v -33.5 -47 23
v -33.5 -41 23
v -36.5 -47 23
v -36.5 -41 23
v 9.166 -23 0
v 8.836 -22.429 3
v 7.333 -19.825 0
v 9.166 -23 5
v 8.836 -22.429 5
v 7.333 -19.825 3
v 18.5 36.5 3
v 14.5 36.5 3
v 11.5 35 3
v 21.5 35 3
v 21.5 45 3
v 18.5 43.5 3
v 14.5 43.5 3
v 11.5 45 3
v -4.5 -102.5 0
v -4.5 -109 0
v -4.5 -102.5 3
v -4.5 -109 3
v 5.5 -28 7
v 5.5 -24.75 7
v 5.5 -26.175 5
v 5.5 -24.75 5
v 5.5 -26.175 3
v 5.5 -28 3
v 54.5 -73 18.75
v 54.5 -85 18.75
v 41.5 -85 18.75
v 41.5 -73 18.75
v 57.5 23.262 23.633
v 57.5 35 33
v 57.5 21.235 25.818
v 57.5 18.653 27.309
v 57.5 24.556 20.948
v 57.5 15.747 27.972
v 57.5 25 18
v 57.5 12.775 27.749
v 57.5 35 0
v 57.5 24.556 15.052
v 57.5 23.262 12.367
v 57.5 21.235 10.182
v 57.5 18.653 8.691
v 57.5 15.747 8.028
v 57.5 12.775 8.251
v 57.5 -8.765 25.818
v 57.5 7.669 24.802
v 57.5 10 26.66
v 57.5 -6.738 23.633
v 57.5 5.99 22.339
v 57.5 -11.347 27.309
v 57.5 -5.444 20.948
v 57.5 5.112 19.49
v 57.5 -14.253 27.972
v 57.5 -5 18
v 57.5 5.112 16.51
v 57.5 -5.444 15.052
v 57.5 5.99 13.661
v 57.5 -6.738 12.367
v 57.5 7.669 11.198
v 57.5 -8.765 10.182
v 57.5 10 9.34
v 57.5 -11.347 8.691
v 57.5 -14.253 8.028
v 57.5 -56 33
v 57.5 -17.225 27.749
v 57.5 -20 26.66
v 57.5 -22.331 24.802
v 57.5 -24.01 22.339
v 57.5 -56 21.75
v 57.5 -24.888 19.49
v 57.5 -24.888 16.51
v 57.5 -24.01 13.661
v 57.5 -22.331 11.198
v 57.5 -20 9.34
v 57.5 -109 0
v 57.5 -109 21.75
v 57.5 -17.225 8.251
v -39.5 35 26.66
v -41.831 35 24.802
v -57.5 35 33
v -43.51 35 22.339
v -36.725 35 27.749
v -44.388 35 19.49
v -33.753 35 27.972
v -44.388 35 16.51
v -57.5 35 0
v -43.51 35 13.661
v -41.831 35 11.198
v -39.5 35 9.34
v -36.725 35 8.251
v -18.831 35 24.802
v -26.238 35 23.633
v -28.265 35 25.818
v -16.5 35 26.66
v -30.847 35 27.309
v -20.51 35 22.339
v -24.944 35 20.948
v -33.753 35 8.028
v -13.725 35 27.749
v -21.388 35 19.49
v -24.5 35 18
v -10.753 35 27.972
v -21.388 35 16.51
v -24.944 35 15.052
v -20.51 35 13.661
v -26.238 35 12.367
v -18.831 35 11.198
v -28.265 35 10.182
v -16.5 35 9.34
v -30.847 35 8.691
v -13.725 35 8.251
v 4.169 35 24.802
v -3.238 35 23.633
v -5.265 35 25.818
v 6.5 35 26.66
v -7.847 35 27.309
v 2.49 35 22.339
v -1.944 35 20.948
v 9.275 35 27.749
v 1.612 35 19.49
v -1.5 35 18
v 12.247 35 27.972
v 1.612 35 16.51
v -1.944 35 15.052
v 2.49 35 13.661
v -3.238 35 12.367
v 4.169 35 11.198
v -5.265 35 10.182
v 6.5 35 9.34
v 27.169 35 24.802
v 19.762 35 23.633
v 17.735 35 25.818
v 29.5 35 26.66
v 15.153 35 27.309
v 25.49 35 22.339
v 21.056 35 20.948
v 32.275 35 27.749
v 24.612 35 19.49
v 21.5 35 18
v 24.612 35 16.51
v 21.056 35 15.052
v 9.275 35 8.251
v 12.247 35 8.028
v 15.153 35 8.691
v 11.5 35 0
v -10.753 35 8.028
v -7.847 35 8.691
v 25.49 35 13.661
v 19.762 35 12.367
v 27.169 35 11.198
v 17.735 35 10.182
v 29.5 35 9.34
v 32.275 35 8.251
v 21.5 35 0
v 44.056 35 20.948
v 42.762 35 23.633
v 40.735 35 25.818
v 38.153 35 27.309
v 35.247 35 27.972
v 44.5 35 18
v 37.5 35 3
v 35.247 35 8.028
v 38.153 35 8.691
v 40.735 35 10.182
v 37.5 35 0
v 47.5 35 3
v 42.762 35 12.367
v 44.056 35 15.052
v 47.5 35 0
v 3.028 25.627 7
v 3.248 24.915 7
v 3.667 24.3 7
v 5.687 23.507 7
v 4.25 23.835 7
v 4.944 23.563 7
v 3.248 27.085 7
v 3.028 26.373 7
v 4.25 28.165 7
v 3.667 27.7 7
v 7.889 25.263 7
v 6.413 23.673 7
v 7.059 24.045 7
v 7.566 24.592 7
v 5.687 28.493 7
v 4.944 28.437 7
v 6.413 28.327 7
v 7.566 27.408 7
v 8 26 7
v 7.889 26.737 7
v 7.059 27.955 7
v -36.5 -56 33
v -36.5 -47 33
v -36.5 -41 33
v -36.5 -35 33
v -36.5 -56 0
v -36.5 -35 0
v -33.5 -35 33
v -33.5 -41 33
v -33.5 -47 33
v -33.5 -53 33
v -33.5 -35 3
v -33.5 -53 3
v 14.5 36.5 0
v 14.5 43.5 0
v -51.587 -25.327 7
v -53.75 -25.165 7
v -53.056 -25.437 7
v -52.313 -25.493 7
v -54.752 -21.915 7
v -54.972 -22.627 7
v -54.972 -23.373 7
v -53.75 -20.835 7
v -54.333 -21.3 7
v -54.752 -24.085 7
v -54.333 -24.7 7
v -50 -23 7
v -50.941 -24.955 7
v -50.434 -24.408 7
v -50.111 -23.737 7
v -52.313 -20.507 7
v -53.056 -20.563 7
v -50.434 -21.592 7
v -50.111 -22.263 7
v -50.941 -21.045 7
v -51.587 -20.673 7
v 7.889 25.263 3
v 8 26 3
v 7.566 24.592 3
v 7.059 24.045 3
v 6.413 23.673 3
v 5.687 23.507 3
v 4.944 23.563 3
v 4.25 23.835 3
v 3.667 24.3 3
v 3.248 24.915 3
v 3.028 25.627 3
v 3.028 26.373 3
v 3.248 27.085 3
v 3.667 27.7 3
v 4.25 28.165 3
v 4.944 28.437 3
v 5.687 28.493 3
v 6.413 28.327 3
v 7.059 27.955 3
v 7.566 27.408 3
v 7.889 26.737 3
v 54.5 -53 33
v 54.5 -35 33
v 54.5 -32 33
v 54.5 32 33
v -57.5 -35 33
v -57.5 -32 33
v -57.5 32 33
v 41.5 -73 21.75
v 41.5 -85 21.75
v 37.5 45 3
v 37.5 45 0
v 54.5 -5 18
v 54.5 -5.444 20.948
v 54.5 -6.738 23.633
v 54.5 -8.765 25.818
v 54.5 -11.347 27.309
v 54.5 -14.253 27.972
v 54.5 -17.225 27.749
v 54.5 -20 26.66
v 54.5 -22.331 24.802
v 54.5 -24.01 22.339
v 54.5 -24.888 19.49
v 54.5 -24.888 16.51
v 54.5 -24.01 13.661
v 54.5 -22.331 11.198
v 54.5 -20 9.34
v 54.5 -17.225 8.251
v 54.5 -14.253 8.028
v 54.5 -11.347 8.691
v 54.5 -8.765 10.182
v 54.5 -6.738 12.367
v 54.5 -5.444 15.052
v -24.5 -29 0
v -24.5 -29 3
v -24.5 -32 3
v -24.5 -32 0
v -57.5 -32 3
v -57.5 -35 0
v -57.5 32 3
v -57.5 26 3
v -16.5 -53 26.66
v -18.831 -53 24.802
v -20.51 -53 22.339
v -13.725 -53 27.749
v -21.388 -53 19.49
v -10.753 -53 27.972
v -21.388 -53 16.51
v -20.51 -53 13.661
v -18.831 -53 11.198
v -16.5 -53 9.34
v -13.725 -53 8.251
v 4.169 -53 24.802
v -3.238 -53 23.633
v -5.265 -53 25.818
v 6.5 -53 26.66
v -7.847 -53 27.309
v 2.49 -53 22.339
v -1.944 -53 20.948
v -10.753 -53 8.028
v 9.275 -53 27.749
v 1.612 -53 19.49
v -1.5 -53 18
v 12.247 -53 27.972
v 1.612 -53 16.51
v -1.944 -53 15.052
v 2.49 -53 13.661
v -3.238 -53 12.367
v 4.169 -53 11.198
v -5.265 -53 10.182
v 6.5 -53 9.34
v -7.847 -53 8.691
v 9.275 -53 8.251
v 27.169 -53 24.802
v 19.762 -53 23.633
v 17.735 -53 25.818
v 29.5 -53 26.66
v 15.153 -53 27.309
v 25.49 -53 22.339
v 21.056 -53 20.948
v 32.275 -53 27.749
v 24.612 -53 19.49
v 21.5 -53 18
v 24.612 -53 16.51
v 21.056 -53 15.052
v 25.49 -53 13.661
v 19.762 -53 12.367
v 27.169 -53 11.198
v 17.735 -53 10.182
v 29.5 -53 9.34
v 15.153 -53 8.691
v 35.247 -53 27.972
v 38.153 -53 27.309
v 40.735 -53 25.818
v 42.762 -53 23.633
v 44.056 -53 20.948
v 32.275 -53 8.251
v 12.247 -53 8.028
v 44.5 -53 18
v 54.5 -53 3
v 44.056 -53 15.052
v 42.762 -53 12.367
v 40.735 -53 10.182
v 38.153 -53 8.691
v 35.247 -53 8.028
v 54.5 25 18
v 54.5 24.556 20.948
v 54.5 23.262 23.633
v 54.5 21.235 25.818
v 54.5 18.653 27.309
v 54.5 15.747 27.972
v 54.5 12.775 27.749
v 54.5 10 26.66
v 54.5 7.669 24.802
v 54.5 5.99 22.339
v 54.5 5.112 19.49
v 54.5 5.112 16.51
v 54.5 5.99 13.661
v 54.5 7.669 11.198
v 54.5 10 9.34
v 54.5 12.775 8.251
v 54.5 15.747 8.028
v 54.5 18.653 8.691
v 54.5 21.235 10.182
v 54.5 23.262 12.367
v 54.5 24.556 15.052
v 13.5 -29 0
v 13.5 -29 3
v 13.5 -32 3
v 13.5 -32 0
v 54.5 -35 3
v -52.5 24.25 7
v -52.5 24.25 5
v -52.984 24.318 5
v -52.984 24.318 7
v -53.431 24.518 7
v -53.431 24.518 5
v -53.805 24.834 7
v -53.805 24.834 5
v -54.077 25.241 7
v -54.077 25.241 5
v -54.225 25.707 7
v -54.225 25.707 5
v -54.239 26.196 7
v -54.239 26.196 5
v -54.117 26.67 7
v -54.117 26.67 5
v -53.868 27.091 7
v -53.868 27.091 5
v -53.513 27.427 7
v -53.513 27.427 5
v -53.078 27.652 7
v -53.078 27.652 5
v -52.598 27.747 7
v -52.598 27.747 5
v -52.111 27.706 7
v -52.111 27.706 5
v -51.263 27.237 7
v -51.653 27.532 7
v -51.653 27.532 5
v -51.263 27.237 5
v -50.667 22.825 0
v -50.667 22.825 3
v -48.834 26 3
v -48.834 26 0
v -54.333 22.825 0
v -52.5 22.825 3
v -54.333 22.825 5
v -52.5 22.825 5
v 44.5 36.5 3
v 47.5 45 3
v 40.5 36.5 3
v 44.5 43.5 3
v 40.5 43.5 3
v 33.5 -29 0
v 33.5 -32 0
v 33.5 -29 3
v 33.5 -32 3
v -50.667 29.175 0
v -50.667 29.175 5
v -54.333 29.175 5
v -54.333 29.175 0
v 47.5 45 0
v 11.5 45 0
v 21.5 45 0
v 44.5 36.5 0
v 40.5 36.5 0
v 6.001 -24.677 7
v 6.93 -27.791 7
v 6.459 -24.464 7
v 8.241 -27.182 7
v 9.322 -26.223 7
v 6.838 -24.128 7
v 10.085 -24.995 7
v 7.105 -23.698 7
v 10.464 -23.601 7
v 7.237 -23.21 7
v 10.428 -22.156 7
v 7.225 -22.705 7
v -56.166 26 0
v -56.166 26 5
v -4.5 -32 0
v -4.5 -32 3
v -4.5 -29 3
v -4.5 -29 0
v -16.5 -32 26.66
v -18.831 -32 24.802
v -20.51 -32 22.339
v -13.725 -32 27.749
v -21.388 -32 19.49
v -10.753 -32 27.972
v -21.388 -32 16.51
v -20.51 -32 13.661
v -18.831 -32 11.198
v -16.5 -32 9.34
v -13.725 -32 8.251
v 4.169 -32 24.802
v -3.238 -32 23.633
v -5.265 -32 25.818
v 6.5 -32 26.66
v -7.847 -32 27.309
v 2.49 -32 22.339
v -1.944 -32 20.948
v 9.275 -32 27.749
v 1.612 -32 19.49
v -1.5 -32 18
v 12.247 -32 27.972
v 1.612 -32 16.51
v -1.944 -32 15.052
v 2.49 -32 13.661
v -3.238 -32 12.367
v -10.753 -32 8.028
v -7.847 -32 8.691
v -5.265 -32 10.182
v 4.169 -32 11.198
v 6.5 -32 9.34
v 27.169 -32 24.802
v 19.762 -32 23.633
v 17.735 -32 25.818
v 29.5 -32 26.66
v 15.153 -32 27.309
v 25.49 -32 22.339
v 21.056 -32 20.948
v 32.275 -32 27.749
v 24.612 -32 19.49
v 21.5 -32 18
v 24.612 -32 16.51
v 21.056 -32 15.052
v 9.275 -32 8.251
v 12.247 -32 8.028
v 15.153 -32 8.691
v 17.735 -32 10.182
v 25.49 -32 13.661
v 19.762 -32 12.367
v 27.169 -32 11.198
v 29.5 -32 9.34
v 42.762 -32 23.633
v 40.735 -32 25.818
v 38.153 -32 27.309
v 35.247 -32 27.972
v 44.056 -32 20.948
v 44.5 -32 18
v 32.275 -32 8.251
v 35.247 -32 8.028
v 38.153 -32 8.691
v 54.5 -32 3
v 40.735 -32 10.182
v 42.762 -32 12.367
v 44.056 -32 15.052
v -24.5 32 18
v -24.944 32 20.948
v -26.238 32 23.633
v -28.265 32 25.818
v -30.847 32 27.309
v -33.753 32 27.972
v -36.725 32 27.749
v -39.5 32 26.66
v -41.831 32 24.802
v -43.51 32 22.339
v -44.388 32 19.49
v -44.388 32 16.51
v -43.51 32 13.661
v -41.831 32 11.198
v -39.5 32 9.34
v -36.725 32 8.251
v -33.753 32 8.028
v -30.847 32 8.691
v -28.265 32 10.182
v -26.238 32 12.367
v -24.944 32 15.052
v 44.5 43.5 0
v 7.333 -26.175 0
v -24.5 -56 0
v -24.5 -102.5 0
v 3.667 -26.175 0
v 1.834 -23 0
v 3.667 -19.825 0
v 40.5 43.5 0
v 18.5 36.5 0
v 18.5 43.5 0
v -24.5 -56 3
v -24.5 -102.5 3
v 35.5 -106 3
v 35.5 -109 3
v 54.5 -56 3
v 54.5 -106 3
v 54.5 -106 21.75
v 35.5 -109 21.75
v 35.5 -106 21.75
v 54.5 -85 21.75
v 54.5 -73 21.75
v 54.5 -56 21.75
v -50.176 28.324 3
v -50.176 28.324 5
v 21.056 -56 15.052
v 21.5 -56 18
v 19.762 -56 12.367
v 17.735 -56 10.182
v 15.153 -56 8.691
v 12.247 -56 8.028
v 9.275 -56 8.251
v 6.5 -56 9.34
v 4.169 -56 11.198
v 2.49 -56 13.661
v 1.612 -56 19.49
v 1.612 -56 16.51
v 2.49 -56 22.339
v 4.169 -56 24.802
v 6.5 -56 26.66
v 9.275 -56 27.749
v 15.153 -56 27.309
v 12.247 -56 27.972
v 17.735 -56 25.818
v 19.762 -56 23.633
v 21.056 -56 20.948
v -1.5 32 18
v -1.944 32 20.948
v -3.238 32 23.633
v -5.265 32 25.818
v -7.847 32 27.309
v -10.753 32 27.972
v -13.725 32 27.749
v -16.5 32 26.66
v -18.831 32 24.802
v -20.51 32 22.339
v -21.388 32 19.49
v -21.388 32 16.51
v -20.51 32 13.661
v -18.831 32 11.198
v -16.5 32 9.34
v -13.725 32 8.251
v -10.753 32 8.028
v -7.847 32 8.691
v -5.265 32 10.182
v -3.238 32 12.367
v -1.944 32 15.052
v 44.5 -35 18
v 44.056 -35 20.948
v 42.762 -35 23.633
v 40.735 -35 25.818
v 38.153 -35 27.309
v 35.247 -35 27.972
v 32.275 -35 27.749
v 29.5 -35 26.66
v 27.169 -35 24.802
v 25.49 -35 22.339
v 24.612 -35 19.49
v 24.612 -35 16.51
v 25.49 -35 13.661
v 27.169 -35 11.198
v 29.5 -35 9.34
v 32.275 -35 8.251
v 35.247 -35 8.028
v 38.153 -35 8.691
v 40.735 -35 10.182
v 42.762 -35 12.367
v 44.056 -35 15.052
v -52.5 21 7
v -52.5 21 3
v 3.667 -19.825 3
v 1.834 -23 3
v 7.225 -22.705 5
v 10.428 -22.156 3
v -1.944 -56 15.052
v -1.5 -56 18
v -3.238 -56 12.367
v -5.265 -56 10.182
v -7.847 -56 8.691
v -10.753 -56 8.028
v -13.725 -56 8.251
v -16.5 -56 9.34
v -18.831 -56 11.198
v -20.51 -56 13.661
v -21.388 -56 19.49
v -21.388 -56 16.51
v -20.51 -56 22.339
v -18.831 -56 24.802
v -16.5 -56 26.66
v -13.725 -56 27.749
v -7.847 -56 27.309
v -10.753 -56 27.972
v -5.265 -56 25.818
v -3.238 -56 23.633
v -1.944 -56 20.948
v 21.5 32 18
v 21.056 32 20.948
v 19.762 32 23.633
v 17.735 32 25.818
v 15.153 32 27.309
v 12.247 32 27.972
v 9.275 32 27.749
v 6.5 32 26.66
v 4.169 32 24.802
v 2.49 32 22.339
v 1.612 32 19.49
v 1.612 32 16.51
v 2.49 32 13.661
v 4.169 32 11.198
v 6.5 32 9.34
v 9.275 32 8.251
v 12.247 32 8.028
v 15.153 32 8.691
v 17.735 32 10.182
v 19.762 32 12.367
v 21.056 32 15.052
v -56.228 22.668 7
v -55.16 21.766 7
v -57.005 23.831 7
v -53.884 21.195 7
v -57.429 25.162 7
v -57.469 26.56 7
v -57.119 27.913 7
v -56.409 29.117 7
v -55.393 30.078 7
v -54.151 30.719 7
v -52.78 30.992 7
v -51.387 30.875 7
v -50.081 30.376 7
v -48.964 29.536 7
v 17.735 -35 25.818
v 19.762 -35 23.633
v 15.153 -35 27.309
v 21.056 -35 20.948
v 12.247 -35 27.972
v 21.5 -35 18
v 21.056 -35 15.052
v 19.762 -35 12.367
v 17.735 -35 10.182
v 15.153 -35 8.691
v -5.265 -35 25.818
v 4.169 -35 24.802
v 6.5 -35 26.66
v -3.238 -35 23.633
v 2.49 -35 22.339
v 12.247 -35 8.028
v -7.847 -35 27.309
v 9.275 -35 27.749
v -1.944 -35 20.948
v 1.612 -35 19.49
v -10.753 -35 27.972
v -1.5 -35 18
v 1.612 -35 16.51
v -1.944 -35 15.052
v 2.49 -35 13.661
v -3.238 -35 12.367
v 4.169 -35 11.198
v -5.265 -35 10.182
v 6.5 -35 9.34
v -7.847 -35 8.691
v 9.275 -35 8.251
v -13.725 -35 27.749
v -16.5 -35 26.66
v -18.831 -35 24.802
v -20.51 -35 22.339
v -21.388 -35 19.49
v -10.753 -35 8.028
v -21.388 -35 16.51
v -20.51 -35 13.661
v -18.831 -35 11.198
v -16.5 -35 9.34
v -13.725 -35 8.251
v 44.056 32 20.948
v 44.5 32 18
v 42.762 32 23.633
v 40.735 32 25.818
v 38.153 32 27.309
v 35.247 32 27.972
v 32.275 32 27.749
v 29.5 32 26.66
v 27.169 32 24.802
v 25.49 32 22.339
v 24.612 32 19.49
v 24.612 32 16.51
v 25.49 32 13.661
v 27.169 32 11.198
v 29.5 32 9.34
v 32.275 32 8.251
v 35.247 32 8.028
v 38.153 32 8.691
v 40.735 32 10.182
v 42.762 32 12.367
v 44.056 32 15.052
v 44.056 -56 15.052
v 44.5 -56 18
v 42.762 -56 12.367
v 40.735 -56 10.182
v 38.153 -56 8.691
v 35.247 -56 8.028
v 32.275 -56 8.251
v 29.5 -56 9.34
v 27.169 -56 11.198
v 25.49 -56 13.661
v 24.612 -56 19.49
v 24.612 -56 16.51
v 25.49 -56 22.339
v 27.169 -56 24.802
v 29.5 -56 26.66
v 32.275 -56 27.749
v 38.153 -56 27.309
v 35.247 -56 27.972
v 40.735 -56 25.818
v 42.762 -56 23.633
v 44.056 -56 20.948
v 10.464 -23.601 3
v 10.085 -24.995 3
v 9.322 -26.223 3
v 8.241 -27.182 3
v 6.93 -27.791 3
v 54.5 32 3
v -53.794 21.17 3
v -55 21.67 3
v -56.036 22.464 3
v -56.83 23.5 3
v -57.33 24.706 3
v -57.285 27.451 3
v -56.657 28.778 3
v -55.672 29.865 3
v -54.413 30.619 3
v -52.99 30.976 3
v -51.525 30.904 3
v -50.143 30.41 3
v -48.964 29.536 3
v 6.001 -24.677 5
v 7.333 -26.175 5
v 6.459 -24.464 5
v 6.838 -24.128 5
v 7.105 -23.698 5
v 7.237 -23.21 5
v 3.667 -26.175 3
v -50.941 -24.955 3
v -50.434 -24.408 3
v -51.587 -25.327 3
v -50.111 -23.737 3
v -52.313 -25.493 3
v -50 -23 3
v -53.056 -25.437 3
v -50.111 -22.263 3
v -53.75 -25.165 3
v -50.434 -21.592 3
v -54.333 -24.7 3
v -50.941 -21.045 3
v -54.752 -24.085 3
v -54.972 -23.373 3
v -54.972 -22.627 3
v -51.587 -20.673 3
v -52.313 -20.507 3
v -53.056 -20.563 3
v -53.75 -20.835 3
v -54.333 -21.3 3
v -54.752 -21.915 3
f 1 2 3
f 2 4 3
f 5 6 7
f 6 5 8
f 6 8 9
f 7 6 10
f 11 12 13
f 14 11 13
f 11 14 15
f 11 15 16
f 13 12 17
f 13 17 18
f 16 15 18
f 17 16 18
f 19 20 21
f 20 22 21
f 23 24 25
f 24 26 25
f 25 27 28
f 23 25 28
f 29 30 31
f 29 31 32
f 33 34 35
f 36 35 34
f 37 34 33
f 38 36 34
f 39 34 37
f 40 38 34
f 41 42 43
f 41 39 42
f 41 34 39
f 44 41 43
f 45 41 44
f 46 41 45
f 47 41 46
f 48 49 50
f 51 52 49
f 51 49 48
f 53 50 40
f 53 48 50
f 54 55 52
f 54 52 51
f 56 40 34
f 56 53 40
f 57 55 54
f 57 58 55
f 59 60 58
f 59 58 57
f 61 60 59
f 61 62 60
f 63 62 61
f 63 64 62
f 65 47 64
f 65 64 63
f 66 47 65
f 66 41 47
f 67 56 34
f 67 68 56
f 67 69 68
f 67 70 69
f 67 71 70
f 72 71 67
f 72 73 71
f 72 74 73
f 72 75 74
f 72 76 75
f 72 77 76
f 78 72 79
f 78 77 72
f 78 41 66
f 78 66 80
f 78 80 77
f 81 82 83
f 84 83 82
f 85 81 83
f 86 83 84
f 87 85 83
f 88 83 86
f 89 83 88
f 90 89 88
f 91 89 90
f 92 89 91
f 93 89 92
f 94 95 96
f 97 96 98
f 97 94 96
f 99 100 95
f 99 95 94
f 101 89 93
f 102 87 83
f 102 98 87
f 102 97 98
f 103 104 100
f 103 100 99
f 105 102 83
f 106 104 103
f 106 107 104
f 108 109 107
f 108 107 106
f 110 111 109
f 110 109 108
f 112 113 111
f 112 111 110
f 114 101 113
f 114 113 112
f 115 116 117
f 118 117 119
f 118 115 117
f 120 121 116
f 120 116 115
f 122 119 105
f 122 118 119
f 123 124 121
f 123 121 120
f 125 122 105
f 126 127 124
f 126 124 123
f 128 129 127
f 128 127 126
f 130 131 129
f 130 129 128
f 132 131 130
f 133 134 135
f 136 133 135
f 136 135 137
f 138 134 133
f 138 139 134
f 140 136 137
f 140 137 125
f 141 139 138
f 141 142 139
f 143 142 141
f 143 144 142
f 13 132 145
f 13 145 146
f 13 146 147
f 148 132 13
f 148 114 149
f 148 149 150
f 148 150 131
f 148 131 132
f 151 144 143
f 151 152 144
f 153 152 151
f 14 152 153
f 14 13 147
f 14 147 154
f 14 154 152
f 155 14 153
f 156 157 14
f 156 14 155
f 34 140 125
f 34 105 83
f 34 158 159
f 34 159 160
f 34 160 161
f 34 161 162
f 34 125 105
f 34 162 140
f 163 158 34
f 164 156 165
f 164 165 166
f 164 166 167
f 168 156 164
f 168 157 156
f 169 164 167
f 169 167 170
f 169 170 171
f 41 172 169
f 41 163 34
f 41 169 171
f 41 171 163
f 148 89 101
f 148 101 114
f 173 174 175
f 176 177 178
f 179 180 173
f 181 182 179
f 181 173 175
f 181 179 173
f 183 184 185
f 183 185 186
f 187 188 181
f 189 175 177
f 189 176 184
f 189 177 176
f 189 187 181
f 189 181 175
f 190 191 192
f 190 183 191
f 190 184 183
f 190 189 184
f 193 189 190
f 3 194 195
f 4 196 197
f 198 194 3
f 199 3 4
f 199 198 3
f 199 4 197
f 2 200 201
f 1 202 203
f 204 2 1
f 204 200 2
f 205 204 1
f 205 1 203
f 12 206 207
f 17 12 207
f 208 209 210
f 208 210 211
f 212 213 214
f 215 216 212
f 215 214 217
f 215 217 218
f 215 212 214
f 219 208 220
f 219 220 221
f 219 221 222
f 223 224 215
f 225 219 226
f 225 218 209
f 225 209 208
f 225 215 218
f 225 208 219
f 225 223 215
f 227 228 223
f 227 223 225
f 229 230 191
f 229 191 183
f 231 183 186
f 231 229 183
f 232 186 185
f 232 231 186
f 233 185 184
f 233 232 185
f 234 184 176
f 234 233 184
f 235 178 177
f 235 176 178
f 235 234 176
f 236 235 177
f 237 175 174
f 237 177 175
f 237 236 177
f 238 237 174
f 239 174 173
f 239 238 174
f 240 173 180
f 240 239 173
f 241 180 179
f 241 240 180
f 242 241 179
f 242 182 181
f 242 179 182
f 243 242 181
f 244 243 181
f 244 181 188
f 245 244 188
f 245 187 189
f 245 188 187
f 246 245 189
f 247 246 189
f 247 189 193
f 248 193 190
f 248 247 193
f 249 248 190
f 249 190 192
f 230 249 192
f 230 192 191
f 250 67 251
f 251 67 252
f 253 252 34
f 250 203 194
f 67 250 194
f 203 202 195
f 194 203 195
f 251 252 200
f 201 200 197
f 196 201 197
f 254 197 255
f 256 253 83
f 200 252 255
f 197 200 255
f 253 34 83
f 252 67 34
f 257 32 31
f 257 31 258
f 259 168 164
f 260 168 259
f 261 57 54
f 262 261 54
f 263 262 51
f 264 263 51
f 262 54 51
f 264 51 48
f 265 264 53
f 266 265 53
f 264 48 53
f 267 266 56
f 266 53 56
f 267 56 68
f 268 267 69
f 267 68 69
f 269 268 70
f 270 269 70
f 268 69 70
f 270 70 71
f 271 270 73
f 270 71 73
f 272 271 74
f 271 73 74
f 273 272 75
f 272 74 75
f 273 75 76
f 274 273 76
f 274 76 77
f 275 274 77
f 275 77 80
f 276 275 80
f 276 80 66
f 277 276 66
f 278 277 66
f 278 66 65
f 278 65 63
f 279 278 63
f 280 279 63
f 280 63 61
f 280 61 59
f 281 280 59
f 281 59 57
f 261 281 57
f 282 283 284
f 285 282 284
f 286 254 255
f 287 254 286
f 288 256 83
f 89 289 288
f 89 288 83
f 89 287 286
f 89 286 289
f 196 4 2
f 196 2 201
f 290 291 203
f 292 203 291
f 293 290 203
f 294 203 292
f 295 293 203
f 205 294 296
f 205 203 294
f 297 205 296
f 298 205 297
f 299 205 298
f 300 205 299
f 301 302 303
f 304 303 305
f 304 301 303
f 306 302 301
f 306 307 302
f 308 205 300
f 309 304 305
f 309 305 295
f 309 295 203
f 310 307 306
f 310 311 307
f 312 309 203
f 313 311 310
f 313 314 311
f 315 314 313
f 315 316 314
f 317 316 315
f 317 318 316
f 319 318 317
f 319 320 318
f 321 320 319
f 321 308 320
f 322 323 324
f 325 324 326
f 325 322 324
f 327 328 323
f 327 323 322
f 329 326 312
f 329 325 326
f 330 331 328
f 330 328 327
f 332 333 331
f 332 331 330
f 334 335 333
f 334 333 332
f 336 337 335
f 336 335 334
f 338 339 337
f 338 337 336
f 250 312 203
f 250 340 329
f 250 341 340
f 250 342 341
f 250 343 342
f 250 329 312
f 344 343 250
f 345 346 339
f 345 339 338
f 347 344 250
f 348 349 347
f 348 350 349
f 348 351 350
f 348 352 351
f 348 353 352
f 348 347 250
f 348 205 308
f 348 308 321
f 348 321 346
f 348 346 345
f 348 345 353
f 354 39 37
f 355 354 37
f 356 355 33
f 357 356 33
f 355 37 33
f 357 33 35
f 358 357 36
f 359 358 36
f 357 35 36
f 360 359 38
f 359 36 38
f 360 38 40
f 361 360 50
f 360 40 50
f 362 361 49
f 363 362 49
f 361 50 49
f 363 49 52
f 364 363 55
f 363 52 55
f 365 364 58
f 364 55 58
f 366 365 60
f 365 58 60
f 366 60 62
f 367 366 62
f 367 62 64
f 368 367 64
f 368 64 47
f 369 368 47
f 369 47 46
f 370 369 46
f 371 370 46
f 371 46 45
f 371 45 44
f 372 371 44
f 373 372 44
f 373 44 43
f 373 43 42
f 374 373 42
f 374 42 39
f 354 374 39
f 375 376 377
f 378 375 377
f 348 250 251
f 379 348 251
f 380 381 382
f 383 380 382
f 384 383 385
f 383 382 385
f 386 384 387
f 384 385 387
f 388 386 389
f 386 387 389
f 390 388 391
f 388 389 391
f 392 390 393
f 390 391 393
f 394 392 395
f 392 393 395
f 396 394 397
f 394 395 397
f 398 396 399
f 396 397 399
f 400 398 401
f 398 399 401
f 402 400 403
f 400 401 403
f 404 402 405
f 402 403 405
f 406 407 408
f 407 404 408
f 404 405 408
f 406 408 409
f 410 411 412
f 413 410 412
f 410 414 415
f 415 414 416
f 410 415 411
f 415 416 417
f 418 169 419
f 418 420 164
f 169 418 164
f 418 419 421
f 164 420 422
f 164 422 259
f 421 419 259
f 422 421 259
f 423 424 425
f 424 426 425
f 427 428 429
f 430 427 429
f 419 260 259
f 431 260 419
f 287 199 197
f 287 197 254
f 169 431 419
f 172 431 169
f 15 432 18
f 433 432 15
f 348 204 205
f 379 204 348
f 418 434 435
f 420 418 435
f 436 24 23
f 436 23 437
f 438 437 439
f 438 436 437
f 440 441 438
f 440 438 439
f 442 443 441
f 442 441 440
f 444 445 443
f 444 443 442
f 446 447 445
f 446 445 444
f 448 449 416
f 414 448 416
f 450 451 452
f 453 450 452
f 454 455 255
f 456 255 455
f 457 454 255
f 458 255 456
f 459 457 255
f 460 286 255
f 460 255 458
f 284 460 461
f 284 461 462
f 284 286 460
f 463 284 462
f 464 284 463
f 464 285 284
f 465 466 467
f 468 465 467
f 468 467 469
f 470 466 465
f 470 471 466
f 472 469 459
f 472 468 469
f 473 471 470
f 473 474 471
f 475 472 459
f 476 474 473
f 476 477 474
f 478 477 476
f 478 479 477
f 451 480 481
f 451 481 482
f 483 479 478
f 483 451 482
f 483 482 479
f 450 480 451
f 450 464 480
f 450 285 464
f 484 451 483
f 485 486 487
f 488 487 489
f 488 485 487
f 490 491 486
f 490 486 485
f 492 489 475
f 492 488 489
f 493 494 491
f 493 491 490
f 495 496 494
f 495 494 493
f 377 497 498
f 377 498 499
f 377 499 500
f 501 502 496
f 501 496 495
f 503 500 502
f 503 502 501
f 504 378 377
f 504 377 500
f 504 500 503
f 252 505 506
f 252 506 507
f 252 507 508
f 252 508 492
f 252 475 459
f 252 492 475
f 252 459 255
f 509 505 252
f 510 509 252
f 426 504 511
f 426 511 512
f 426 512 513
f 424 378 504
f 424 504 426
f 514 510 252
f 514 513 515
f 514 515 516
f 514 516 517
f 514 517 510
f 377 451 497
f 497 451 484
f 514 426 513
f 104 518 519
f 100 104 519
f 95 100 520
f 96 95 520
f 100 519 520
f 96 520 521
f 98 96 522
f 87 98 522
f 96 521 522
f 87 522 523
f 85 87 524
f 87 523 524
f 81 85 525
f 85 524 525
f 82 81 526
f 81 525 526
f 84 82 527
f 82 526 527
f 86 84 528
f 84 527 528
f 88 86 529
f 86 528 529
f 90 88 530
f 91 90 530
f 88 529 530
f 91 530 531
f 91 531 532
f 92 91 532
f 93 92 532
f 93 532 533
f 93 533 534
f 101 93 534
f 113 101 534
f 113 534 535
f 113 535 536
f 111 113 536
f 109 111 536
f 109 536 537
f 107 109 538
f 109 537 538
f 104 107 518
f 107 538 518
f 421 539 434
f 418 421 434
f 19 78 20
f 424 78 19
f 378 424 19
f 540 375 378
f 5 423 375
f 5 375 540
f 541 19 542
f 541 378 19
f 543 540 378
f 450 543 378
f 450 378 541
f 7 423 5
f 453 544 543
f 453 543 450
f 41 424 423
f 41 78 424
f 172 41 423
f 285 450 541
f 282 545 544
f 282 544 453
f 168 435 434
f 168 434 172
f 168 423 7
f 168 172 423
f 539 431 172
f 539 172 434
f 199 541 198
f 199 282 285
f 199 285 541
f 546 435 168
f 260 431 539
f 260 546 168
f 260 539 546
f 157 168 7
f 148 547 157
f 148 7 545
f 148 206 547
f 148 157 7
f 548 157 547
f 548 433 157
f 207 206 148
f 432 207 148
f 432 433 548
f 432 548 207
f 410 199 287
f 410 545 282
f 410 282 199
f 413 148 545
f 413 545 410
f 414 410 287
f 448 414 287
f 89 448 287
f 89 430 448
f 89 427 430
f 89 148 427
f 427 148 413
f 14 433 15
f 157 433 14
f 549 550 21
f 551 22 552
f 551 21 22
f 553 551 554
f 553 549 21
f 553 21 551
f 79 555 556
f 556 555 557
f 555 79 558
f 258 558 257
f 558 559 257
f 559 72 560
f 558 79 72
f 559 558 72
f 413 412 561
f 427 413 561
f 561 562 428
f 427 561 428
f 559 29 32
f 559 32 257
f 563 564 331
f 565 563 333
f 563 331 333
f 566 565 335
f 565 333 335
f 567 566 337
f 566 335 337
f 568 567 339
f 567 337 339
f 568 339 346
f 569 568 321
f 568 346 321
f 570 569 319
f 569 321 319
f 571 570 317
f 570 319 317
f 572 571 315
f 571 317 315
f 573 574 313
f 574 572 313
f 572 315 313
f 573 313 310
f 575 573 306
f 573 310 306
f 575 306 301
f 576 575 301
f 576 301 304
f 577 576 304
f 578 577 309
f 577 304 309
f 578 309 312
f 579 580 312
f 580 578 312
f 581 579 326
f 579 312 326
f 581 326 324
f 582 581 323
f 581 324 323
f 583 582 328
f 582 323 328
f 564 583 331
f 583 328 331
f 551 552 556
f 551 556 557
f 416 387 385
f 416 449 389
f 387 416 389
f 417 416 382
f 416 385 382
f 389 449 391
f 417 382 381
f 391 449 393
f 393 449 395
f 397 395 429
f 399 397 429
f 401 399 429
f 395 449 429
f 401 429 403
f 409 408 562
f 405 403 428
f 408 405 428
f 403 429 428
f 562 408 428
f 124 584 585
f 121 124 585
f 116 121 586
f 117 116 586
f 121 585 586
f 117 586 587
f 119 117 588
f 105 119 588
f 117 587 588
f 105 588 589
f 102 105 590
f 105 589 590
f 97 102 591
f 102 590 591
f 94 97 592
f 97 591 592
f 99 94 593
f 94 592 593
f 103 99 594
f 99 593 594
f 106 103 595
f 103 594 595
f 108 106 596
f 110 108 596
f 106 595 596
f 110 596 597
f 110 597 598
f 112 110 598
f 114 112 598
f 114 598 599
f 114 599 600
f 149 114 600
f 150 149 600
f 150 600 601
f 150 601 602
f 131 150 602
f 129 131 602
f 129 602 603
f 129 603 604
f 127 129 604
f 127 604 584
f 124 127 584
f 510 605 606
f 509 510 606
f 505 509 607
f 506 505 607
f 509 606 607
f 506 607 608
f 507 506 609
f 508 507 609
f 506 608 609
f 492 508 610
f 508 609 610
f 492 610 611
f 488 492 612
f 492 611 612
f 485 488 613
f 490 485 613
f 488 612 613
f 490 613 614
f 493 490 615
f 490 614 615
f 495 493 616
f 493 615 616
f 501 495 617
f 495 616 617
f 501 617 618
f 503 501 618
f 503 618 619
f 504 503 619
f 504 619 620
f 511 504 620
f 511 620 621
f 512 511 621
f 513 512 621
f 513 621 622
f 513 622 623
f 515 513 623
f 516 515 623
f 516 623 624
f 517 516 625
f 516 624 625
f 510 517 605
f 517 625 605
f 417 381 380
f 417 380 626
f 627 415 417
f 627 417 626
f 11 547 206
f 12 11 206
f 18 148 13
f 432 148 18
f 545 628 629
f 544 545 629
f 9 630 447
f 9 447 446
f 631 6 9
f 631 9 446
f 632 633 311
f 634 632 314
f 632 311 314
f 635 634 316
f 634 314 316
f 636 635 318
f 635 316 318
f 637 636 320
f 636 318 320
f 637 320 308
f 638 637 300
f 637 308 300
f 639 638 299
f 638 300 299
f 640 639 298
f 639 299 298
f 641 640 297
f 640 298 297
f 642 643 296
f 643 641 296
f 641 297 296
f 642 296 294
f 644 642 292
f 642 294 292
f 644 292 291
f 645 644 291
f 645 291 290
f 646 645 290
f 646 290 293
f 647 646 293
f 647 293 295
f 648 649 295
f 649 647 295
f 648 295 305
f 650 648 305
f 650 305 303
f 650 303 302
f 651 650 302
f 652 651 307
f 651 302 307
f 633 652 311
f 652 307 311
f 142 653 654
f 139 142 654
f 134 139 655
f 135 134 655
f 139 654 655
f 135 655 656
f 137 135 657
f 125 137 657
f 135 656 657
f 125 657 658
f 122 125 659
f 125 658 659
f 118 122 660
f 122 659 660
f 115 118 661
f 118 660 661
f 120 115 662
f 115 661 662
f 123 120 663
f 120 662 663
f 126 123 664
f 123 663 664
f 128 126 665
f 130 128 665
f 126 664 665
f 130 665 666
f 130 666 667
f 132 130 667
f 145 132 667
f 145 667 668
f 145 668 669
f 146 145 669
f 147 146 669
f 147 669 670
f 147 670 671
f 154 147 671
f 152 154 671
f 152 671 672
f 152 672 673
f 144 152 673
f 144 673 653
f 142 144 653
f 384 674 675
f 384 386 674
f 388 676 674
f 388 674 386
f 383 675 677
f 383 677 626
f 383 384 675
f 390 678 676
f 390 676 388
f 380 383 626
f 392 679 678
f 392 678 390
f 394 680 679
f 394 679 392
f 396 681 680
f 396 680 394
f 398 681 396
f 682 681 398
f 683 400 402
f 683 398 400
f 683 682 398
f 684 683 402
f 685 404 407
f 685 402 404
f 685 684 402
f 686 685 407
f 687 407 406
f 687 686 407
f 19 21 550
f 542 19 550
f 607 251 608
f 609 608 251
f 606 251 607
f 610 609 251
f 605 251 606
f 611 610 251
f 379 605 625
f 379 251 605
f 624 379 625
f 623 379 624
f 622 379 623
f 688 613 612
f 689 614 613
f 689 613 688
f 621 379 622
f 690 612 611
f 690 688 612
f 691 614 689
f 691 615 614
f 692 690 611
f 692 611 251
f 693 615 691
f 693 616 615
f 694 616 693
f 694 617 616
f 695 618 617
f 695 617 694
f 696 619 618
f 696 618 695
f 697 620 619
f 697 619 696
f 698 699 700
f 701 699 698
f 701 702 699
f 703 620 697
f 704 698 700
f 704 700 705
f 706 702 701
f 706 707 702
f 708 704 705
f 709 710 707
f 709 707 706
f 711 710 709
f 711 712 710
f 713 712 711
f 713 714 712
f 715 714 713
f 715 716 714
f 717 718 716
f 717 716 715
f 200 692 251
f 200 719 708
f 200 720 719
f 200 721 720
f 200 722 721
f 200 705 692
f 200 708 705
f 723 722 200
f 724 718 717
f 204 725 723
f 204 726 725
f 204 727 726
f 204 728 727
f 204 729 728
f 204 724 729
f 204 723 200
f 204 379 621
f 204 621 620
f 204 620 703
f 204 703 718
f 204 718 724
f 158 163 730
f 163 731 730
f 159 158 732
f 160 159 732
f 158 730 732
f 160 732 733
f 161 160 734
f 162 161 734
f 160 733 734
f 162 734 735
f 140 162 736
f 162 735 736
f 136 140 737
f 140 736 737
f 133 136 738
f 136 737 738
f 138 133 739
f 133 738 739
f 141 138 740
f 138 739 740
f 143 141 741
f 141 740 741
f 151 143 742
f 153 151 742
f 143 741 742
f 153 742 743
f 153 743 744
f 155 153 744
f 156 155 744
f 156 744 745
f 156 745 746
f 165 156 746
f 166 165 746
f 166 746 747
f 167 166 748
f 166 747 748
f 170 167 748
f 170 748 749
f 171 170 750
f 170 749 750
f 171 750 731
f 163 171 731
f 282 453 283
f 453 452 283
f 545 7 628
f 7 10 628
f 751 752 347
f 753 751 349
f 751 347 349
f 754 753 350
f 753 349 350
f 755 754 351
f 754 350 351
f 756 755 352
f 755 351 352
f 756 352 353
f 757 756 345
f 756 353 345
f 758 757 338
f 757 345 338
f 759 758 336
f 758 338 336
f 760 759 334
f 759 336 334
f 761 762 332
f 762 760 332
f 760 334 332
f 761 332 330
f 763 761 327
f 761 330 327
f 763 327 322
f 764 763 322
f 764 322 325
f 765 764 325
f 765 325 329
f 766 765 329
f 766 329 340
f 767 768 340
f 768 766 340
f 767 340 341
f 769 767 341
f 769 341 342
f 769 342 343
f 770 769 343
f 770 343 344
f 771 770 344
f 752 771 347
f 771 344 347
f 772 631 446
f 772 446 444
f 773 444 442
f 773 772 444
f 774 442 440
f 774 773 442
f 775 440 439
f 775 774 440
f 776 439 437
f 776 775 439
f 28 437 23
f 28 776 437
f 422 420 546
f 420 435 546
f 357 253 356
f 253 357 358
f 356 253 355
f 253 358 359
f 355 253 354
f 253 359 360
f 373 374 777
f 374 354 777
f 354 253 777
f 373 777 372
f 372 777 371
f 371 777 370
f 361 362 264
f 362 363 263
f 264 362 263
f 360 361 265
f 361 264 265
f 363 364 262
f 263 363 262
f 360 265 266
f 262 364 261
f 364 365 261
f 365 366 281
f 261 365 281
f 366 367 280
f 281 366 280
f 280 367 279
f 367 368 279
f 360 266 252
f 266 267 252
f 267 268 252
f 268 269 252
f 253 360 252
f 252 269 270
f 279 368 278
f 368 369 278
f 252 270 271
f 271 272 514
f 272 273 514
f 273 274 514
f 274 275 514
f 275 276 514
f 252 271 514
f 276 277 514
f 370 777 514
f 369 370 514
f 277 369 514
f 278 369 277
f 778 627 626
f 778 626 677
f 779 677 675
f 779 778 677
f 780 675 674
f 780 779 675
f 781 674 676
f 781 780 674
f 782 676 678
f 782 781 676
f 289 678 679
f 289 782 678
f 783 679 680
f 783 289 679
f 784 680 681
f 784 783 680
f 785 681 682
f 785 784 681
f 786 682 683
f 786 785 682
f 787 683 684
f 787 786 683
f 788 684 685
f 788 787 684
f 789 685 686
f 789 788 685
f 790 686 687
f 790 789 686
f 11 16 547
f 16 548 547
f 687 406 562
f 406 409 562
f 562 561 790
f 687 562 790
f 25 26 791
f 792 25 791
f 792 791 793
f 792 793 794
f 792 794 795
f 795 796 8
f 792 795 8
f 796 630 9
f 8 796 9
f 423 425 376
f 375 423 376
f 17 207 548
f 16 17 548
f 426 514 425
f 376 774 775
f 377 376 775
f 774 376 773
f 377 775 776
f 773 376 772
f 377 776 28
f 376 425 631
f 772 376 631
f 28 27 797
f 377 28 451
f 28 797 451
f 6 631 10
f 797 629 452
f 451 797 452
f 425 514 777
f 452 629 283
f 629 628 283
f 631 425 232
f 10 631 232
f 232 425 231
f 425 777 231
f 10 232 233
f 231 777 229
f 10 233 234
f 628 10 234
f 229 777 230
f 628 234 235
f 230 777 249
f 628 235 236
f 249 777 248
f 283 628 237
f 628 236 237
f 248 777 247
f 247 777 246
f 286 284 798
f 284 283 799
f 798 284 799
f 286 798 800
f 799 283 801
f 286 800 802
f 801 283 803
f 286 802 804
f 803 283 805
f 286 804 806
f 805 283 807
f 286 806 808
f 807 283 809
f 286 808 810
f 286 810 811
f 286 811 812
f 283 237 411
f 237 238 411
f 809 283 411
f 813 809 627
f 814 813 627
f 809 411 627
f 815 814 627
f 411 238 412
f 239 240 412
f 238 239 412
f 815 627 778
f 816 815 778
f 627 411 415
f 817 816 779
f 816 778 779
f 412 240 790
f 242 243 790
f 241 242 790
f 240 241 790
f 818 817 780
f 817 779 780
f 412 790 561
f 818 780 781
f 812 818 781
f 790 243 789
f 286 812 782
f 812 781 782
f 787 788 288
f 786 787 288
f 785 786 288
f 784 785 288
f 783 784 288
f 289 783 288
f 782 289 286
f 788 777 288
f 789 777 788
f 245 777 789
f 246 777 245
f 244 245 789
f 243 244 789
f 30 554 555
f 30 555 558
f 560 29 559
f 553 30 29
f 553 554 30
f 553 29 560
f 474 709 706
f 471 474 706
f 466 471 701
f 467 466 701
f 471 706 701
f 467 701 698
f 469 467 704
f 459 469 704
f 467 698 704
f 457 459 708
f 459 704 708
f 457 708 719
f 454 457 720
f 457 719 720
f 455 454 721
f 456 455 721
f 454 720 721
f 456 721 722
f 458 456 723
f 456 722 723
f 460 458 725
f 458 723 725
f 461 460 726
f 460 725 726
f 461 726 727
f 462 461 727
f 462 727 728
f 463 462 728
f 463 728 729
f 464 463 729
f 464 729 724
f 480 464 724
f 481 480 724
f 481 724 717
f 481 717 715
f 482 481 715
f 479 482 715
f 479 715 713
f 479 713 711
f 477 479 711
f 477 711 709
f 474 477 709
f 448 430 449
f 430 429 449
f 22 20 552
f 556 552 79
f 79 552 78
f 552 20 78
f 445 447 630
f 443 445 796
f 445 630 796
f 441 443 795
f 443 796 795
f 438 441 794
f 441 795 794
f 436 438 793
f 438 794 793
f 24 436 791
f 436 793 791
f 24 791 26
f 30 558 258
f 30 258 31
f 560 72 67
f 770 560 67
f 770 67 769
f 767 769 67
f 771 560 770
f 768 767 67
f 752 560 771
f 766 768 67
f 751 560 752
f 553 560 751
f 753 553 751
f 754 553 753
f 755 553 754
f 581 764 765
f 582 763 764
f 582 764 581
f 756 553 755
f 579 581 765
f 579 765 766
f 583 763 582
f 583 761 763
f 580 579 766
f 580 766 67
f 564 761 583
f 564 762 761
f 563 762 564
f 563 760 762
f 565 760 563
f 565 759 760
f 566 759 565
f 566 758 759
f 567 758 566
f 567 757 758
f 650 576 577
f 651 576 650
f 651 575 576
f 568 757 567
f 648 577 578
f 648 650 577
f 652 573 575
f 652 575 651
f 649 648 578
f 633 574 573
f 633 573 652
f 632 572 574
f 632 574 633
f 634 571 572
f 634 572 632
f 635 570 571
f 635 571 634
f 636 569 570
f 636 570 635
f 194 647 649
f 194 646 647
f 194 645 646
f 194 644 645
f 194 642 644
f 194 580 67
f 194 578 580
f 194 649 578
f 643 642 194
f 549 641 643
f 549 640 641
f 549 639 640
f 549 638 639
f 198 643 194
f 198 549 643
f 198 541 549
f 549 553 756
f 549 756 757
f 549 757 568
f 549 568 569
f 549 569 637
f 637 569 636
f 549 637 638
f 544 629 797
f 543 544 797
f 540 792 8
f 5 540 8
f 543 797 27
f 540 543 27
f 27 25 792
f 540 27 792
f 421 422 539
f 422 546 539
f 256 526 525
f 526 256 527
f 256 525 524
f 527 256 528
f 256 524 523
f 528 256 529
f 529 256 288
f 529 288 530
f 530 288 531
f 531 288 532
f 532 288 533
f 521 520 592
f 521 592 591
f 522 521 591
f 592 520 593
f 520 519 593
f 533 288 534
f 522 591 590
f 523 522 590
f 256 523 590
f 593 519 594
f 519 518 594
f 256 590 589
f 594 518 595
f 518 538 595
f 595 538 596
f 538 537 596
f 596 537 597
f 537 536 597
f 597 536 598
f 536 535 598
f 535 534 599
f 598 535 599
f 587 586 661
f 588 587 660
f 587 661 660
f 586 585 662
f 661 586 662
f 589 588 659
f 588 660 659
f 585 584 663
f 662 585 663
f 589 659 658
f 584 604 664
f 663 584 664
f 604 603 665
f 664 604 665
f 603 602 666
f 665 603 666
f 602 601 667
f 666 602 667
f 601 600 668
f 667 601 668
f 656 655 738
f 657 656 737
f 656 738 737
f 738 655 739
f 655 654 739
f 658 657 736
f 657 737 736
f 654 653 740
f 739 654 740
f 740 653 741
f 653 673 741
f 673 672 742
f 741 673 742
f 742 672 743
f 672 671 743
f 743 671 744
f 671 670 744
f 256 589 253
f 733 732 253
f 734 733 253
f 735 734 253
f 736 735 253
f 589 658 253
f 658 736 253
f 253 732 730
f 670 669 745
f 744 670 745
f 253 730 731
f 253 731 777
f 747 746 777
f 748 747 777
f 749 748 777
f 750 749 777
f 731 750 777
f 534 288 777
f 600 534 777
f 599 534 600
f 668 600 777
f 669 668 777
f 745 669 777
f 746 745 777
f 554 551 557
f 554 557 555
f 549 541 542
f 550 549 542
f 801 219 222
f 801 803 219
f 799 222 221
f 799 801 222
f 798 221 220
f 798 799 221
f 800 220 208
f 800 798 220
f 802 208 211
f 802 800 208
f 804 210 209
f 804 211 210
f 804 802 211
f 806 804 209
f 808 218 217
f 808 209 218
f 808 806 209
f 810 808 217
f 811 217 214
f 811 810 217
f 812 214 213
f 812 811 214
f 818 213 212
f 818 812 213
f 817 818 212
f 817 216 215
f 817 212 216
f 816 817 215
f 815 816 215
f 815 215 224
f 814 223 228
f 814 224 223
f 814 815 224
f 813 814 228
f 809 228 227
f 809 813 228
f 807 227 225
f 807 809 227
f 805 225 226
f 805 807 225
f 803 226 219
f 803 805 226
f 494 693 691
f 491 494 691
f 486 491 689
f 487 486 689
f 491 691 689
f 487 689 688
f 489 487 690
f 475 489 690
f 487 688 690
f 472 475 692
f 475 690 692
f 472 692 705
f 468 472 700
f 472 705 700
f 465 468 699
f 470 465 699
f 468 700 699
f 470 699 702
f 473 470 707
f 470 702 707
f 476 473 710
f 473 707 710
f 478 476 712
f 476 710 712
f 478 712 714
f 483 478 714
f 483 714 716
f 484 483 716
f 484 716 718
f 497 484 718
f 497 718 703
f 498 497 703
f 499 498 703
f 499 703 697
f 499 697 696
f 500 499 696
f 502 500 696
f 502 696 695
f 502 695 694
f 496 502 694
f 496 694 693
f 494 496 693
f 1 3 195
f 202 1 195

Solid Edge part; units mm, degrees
sketch "Sketch1" plane through (0, 0, 0) normal (0, 0, 1) x (1, 0, 0)
  line L0 (57.5, -35) -> (-57.5, -35)
  line L1 (-57.5, -35) -> (-57.5, 35)
  line L2 (-57.5, 35) -> (57.5, 35)
  line L3 (57.5, 35) -> (57.5, -35)
extrude "Protrusion1" add sketch "Sketch1" along normal blind 3
sketch "Sketch2" plane through (0, 0, 3) normal (0, 0, 1) x (1, 0, 0)
  circle A0 centre (-52.5, -23) radius 2.5
  circle A1 centre (5.5, 26) radius 2.5
  circle A2 centre (5.5, -23) radius 5
  circle A3 centre (5.5, -23) radius 1.75
  circle A4 centre (-52.5, 26) radius 1.75
  circle A5 centre (-52.5, 26) radius 5
  dimension "D1" = 5
  dimension "D2" = 5
  dimension "D3" = 3.5
  dimension "D4" = 10
  dimension "D5" = 49
  dimension "D6" = 3.5
  dimension "D7" = 10
  dimension "D8" = 49
  dimension "D9" = 58
  dimension "D10" = 5
  dimension "D11" = 12
extrude "ExtrudedProtrusion_2" add sketch "Sketch2" along normal blind 4
sketch "Sketch3" plane through (0, 0, 3) normal (0, 0, 1) x (1, 0, 0)
  line L0 (-52.5, 26) -> (-52.5, 21)
  line L1 (-52.5, 26) -> (-48.9645, 29.5355)
  arc A0 (-48.9645, 29.5355) -> (-52.5, 21) centre (-52.5, 26) cw
  line L2 (5.5, -23) -> (5.5, -28)
  line L3 (5.5, -23) -> (10.4282, -22.1558)
  arc A1 (5.5, -28) -> (10.4282, -22.1558) centre (5.5, -23) cw
extrude "ExtrudedCutout_1" cut sketch "Sketch3" along normal blind 4
sketch "Sketch4" plane through (0, 0, 3) normal (0, 0, 1) x (1, 0, 0)
  line L0 (-48.8338, 26) -> (-50.6669, 29.175)
  line L1 (-50.6669, 29.175) -> (-54.3331, 29.175)
  line L2 (-54.3331, 29.175) -> (-56.1662, 26)
  line L3 (-56.1662, 26) -> (-54.3331, 22.825)
  line L4 (-54.3331, 22.825) -> (-50.6669, 22.825)
  line L5 (-50.6669, 22.825) -> (-48.8338, 26)
  line L6 (1.8338, -23) -> (3.6669, -26.175)
  line L7 (3.6669, -26.175) -> (7.3331, -26.175)
  line L8 (7.3331, -26.175) -> (9.1662, -23)
  line L9 (9.1662, -23) -> (7.3331, -19.825)
  line L10 (7.3331, -19.825) -> (3.6669, -19.825)
  line L11 (3.6669, -19.825) -> (1.8338, -23)
  dimension "D1" = 6.35
  dimension "D2" = 6.35
extrude "Cutout1" cut sketch "Sketch4" against normal up to vertex (3 mm away)
sketch "Sketch5" plane through (0, 0, 3) normal (0, 0, 1) x (1, 0, 0)
  line L0 (-50.6669, 22.825) -> (-48.8338, 26)
  line L1 (-48.8338, 26) -> (-50.6669, 29.175)
  line L2 (-50.6669, 29.175) -> (-54.3331, 29.175)
  line L3 (-54.3331, 29.175) -> (-56.1662, 26)
  line L4 (-56.1662, 26) -> (-54.3331, 22.825)
  line L5 (-54.3331, 22.825) -> (-50.6669, 22.825)
extrude "ExtrudedCutout_3" cut sketch "Sketch5" along normal blind 2
sketch "Sketch6" plane through (0, 0, 3) normal (0, 0, 1) x (1, 0, 0)
  line L0 (1.8338, -23) -> (3.6669, -26.175)
  line L1 (3.6669, -26.175) -> (7.3331, -26.175)
  line L2 (7.3331, -26.175) -> (9.1662, -23)
  line L3 (9.1662, -23) -> (7.3331, -19.825)
  line L4 (7.3331, -19.825) -> (3.6669, -19.825)
  line L5 (3.6669, -19.825) -> (1.8338, -23)
extrude "ExtrudedCutout_4" cut sketch "Sketch6" along normal blind 2
extrude "ExtrudedCutout_5" [suppressed]
sketch "Sketch7" plane through (0, 0, 3) normal (0, 0, 1) x (1, 0, 0)
  line L0 (57.5, -35) -> (-57.5, -35)
  line L1 (-57.5, -35) -> (-57.5, -32)
  line L2 (-57.5, -32) -> (54.5, -32)
  line L3 (54.5, 32) -> (54.5, -32)
  line L4 (-57.5, 32) -> (54.5, 32)
  line L5 (-57.5, 35) -> (-57.5, 32)
  line L6 (57.5, 35) -> (-57.5, 35)
  line L7 (57.5, 32) -> (57.5, 35)
  line L8 (57.5, 32) -> (57.5, -35)
extrude "ExtrudedProtrusion_6" add sketch "Sketch7" along normal blind 30
sketch "Sketch8" plane through (0, 0, 0) normal (0, 0, -1) x (1, 0, 0)
  line L0 (37.5, -45) -> (47.5, -45)
  line L1 (47.5, -45) -> (47.5, -35)
  line L2 (47.5, -35) -> (37.5, -35)
  line L3 (37.5, -35) -> (37.5, -45)
  line L4 (40.5, -43.5) -> (44.5, -43.5)
  line L5 (44.5, -43.5) -> (44.5, -36.5)
  line L6 (44.5, -36.5) -> (40.5, -36.5)
  line L7 (40.5, -36.5) -> (40.5, -43.5)
  line L8 (11.5, -45) -> (21.5, -45)
  line L9 (21.5, -45) -> (21.5, -35)
  line L10 (21.5, -35) -> (11.5, -35)
  line L11 (11.5, -35) -> (11.5, -45)
  line L12 (14.5, -43.5) -> (18.5, -43.5)
  line L13 (18.5, -43.5) -> (18.5, -36.5)
  line L14 (18.5, -36.5) -> (14.5, -36.5)
  line L15 (14.5, -36.5) -> (14.5, -43.5)
  dimension "D1" = 10
  dimension "D2" = 4
  dimension "D3" = 7
  dimension "D4" = 10
  dimension "D5" = 10
  dimension "D6" = 22
  dimension "D7" = 3
  dimension "D8" = 1.5
  dimension "D9" = 1.5
  dimension "D10" = 3
  dimension "D11" = 10
extrude "ExtrudedProtrusion_7" add sketch "Sketch8" against normal blind 3
sketch "Sketch9" plane through (-0.75, -35, 16.5) normal (0, -1, 0) x (1, 0, 0)
  circle A0 centre (-33.75, 1.5) radius 10
  circle A1 centre (-10.75, 1.5) radius 10
  circle A2 centre (12.25, 1.5) radius 10
  circle A3 centre (35.25, 1.5) radius 10
  dimension "D1" = 20
  dimension "D2" = 23
  dimension "D3" = 23
  dimension "D4" = 23
  dimension "D5" = 23
extrude "Cutout2" cut sketch "Sketch9" against normal up to vertex (70 mm away)
sketch "Sketch10" plane through (57.5, 0.75, 16.5) normal (1, 0, 0) x (0, 1, 0)
  circle A0 centre (-15.75, 1.5) radius 10
  circle A1 centre (14.25, 1.5) radius 10
  dimension "D1" = 20
  dimension "D2" = 15
  dimension "D3" = 15
extrude "Cutout3" cut sketch "Sketch10" against normal up to vertex (3 mm away)
sketch "Sketch11" plane through (0, 5, 0) normal (0, 0, -1) x (1, 0, 0)
  line L0 (-36.5, 40) -> (-36.5, 61)
  line L1 (57.5, 61) -> (-36.5, 61)
  line L2 (57.5, 40) -> (57.5, 61)
  line L3 (57.5, 40) -> (-36.5, 40)
extrude "ExtrudedProtrusion_10" add sketch "Sketch11" against normal blind 3
sketch "Sketch12" plane through (10.5, -45.5, 3) normal (0, 0, 1) x (1, 0, 0)
  line L0 (-44, -7.5) -> (44, -7.5)
  line L1 (44, -7.5) -> (44, 10.5)
  line L2 (44, 10.5) -> (47, 10.5)
  line L3 (47, 10.5) -> (47, -10.5)
  line L4 (47, -10.5) -> (-47, -10.5)
  line L5 (-47, -10.5) -> (-47, 10.5)
  line L6 (-47, 10.5) -> (-44, 10.5)
  line L7 (-44, 10.5) -> (-44, -7.5)
extrude "Protrusion2" add sketch "Sketch12" along normal up to vertex (30 mm away)
sketch "Sketch13" plane through (-0.75, -35, 16.5) normal (0, -1, 0) x (1, 0, 0)
  circle A0 centre (-33.75, 1.5) radius 10
extrude "Protrusion3" add sketch "Sketch13" against normal up to vertex (3 mm away)
sketch "Sketch14" plane through (-0.75, -35, 16.5) normal (0, -1, 0) x (1, 0, 0)
  circle A0 centre (35.25, 1.5) radius 10
  circle A1 centre (12.25, 1.5) radius 10
  circle A2 centre (-10.75, 1.5) radius 10
  dimension "D1" = 20
  dimension "D2" = 23
  dimension "D3" = 23
  dimension "D4" = 23
  dimension "D5" = 23
extrude "Cutout4" cut sketch "Sketch14" along normal up to vertex (21 mm away)
sketch "Sketch15" plane through (0, 0, 0) normal (0, 0, 1) x (1, 0, 0)
  line L0 (-24.5, -109) -> (57.5, -109)
  line L1 (57.5, -109) -> (57.5, -56)
  line L2 (57.5, -56) -> (-24.5, -56)
  line L3 (-24.5, -56) -> (-24.5, -109)
extrude "Protrusion4" add sketch "Sketch15" along normal up to vertex (3 mm away)
sketch "Sketch16" plane through (13.5, -82, 3) normal (0, 0, 1) x (0, -1, 0)
  line L0 (24, 22) -> (24, 41)
  line L1 (24, 41) -> (-26, 41)
  line L2 (-26, 41) -> (-26, 44)
  line L3 (-26, 44) -> (27, 44)
  line L4 (27, 44) -> (27, 22)
  line L5 (27, 22) -> (24, 22)
extrude "ExtrudedProtrusion_18" add sketch "Sketch16" along normal blind 18.75
extrude "ExtrudedProtrusion_13" [suppressed]
sketch "Sketch17" plane through (-36.5, -45.5, 16.5) normal (-1, 0, 0) x (0, -1, 0)
  line L0 (-1.5, 6.5) -> (1.5, 6.5)
  line L1 (1.5, 6.5) -> (1.5, 16.5)
  line L2 (1.5, 16.5) -> (-1.5, 16.5)
  line L3 (-4.5, 16.5) -> (-1.5, 16.5)
  line L4 (-4.5, 6.5) -> (-4.5, 16.5)
  line L5 (-1.5, 6.5) -> (-4.5, 6.5)
extrude "ExtrudedCutout_12" cut sketch "Sketch17" against normal blind 3
sketch "Sketch18" plane through (-1.5, 0, 3) normal (0, 0, 1) x (0, -1, 0)
  line L0 (29, 15) -> (32, 15)
  line L1 (32, 15) -> (32, 35)
  line L2 (32, 35) -> (29, 35)
  line L3 (29, 35) -> (29, 15)
  line L4 (32, -3) -> (29, -3)
  line L5 (29, -3) -> (29, -23)
  line L6 (29, -23) -> (32, -23)
  line L7 (32, -23) -> (32, -3)
  line L8 (109, -3) -> (102.5, -3)
  line L9 (102.5, -3) -> (102.5, -23)
  line L10 (102.5, -23) -> (109, -23)
  line L11 (109, -23) -> (109, -3)
  dimension "D1" = 21
  dimension "D2" = 20
  dimension "D3" = 3
  dimension "D4" = 18
  dimension "D5" = 20
  dimension "D6" = 6.5
extrude "ExtrudedCutout_13" cut sketch "Sketch18" against normal blind 3
sketch "Sketch19" plane through (54.5, -84.5, 13) normal (-1, 0, 0) x (0, -1, 0)
  line L0 (0.5, 5.75) -> (-11.5, 5.75)
  line L1 (-11.5, 5.75) -> (-11.5, 8.75)
  line L2 (-11.5, 8.75) -> (0.5, 8.75)
  line L3 (0.5, 8.75) -> (0.5, 5.75)
extrude "ExtrudedProtrusion_19" add sketch "Sketch19" along normal blind 13
fillet "Round_2" [suppressed]
fillet "Round_3" [suppressed]
extrude "Cutout5" [suppressed]
extrude "Cutout6" [suppressed]
fillet "Round_4" [suppressed]
fillet "Round_5" [suppressed]
